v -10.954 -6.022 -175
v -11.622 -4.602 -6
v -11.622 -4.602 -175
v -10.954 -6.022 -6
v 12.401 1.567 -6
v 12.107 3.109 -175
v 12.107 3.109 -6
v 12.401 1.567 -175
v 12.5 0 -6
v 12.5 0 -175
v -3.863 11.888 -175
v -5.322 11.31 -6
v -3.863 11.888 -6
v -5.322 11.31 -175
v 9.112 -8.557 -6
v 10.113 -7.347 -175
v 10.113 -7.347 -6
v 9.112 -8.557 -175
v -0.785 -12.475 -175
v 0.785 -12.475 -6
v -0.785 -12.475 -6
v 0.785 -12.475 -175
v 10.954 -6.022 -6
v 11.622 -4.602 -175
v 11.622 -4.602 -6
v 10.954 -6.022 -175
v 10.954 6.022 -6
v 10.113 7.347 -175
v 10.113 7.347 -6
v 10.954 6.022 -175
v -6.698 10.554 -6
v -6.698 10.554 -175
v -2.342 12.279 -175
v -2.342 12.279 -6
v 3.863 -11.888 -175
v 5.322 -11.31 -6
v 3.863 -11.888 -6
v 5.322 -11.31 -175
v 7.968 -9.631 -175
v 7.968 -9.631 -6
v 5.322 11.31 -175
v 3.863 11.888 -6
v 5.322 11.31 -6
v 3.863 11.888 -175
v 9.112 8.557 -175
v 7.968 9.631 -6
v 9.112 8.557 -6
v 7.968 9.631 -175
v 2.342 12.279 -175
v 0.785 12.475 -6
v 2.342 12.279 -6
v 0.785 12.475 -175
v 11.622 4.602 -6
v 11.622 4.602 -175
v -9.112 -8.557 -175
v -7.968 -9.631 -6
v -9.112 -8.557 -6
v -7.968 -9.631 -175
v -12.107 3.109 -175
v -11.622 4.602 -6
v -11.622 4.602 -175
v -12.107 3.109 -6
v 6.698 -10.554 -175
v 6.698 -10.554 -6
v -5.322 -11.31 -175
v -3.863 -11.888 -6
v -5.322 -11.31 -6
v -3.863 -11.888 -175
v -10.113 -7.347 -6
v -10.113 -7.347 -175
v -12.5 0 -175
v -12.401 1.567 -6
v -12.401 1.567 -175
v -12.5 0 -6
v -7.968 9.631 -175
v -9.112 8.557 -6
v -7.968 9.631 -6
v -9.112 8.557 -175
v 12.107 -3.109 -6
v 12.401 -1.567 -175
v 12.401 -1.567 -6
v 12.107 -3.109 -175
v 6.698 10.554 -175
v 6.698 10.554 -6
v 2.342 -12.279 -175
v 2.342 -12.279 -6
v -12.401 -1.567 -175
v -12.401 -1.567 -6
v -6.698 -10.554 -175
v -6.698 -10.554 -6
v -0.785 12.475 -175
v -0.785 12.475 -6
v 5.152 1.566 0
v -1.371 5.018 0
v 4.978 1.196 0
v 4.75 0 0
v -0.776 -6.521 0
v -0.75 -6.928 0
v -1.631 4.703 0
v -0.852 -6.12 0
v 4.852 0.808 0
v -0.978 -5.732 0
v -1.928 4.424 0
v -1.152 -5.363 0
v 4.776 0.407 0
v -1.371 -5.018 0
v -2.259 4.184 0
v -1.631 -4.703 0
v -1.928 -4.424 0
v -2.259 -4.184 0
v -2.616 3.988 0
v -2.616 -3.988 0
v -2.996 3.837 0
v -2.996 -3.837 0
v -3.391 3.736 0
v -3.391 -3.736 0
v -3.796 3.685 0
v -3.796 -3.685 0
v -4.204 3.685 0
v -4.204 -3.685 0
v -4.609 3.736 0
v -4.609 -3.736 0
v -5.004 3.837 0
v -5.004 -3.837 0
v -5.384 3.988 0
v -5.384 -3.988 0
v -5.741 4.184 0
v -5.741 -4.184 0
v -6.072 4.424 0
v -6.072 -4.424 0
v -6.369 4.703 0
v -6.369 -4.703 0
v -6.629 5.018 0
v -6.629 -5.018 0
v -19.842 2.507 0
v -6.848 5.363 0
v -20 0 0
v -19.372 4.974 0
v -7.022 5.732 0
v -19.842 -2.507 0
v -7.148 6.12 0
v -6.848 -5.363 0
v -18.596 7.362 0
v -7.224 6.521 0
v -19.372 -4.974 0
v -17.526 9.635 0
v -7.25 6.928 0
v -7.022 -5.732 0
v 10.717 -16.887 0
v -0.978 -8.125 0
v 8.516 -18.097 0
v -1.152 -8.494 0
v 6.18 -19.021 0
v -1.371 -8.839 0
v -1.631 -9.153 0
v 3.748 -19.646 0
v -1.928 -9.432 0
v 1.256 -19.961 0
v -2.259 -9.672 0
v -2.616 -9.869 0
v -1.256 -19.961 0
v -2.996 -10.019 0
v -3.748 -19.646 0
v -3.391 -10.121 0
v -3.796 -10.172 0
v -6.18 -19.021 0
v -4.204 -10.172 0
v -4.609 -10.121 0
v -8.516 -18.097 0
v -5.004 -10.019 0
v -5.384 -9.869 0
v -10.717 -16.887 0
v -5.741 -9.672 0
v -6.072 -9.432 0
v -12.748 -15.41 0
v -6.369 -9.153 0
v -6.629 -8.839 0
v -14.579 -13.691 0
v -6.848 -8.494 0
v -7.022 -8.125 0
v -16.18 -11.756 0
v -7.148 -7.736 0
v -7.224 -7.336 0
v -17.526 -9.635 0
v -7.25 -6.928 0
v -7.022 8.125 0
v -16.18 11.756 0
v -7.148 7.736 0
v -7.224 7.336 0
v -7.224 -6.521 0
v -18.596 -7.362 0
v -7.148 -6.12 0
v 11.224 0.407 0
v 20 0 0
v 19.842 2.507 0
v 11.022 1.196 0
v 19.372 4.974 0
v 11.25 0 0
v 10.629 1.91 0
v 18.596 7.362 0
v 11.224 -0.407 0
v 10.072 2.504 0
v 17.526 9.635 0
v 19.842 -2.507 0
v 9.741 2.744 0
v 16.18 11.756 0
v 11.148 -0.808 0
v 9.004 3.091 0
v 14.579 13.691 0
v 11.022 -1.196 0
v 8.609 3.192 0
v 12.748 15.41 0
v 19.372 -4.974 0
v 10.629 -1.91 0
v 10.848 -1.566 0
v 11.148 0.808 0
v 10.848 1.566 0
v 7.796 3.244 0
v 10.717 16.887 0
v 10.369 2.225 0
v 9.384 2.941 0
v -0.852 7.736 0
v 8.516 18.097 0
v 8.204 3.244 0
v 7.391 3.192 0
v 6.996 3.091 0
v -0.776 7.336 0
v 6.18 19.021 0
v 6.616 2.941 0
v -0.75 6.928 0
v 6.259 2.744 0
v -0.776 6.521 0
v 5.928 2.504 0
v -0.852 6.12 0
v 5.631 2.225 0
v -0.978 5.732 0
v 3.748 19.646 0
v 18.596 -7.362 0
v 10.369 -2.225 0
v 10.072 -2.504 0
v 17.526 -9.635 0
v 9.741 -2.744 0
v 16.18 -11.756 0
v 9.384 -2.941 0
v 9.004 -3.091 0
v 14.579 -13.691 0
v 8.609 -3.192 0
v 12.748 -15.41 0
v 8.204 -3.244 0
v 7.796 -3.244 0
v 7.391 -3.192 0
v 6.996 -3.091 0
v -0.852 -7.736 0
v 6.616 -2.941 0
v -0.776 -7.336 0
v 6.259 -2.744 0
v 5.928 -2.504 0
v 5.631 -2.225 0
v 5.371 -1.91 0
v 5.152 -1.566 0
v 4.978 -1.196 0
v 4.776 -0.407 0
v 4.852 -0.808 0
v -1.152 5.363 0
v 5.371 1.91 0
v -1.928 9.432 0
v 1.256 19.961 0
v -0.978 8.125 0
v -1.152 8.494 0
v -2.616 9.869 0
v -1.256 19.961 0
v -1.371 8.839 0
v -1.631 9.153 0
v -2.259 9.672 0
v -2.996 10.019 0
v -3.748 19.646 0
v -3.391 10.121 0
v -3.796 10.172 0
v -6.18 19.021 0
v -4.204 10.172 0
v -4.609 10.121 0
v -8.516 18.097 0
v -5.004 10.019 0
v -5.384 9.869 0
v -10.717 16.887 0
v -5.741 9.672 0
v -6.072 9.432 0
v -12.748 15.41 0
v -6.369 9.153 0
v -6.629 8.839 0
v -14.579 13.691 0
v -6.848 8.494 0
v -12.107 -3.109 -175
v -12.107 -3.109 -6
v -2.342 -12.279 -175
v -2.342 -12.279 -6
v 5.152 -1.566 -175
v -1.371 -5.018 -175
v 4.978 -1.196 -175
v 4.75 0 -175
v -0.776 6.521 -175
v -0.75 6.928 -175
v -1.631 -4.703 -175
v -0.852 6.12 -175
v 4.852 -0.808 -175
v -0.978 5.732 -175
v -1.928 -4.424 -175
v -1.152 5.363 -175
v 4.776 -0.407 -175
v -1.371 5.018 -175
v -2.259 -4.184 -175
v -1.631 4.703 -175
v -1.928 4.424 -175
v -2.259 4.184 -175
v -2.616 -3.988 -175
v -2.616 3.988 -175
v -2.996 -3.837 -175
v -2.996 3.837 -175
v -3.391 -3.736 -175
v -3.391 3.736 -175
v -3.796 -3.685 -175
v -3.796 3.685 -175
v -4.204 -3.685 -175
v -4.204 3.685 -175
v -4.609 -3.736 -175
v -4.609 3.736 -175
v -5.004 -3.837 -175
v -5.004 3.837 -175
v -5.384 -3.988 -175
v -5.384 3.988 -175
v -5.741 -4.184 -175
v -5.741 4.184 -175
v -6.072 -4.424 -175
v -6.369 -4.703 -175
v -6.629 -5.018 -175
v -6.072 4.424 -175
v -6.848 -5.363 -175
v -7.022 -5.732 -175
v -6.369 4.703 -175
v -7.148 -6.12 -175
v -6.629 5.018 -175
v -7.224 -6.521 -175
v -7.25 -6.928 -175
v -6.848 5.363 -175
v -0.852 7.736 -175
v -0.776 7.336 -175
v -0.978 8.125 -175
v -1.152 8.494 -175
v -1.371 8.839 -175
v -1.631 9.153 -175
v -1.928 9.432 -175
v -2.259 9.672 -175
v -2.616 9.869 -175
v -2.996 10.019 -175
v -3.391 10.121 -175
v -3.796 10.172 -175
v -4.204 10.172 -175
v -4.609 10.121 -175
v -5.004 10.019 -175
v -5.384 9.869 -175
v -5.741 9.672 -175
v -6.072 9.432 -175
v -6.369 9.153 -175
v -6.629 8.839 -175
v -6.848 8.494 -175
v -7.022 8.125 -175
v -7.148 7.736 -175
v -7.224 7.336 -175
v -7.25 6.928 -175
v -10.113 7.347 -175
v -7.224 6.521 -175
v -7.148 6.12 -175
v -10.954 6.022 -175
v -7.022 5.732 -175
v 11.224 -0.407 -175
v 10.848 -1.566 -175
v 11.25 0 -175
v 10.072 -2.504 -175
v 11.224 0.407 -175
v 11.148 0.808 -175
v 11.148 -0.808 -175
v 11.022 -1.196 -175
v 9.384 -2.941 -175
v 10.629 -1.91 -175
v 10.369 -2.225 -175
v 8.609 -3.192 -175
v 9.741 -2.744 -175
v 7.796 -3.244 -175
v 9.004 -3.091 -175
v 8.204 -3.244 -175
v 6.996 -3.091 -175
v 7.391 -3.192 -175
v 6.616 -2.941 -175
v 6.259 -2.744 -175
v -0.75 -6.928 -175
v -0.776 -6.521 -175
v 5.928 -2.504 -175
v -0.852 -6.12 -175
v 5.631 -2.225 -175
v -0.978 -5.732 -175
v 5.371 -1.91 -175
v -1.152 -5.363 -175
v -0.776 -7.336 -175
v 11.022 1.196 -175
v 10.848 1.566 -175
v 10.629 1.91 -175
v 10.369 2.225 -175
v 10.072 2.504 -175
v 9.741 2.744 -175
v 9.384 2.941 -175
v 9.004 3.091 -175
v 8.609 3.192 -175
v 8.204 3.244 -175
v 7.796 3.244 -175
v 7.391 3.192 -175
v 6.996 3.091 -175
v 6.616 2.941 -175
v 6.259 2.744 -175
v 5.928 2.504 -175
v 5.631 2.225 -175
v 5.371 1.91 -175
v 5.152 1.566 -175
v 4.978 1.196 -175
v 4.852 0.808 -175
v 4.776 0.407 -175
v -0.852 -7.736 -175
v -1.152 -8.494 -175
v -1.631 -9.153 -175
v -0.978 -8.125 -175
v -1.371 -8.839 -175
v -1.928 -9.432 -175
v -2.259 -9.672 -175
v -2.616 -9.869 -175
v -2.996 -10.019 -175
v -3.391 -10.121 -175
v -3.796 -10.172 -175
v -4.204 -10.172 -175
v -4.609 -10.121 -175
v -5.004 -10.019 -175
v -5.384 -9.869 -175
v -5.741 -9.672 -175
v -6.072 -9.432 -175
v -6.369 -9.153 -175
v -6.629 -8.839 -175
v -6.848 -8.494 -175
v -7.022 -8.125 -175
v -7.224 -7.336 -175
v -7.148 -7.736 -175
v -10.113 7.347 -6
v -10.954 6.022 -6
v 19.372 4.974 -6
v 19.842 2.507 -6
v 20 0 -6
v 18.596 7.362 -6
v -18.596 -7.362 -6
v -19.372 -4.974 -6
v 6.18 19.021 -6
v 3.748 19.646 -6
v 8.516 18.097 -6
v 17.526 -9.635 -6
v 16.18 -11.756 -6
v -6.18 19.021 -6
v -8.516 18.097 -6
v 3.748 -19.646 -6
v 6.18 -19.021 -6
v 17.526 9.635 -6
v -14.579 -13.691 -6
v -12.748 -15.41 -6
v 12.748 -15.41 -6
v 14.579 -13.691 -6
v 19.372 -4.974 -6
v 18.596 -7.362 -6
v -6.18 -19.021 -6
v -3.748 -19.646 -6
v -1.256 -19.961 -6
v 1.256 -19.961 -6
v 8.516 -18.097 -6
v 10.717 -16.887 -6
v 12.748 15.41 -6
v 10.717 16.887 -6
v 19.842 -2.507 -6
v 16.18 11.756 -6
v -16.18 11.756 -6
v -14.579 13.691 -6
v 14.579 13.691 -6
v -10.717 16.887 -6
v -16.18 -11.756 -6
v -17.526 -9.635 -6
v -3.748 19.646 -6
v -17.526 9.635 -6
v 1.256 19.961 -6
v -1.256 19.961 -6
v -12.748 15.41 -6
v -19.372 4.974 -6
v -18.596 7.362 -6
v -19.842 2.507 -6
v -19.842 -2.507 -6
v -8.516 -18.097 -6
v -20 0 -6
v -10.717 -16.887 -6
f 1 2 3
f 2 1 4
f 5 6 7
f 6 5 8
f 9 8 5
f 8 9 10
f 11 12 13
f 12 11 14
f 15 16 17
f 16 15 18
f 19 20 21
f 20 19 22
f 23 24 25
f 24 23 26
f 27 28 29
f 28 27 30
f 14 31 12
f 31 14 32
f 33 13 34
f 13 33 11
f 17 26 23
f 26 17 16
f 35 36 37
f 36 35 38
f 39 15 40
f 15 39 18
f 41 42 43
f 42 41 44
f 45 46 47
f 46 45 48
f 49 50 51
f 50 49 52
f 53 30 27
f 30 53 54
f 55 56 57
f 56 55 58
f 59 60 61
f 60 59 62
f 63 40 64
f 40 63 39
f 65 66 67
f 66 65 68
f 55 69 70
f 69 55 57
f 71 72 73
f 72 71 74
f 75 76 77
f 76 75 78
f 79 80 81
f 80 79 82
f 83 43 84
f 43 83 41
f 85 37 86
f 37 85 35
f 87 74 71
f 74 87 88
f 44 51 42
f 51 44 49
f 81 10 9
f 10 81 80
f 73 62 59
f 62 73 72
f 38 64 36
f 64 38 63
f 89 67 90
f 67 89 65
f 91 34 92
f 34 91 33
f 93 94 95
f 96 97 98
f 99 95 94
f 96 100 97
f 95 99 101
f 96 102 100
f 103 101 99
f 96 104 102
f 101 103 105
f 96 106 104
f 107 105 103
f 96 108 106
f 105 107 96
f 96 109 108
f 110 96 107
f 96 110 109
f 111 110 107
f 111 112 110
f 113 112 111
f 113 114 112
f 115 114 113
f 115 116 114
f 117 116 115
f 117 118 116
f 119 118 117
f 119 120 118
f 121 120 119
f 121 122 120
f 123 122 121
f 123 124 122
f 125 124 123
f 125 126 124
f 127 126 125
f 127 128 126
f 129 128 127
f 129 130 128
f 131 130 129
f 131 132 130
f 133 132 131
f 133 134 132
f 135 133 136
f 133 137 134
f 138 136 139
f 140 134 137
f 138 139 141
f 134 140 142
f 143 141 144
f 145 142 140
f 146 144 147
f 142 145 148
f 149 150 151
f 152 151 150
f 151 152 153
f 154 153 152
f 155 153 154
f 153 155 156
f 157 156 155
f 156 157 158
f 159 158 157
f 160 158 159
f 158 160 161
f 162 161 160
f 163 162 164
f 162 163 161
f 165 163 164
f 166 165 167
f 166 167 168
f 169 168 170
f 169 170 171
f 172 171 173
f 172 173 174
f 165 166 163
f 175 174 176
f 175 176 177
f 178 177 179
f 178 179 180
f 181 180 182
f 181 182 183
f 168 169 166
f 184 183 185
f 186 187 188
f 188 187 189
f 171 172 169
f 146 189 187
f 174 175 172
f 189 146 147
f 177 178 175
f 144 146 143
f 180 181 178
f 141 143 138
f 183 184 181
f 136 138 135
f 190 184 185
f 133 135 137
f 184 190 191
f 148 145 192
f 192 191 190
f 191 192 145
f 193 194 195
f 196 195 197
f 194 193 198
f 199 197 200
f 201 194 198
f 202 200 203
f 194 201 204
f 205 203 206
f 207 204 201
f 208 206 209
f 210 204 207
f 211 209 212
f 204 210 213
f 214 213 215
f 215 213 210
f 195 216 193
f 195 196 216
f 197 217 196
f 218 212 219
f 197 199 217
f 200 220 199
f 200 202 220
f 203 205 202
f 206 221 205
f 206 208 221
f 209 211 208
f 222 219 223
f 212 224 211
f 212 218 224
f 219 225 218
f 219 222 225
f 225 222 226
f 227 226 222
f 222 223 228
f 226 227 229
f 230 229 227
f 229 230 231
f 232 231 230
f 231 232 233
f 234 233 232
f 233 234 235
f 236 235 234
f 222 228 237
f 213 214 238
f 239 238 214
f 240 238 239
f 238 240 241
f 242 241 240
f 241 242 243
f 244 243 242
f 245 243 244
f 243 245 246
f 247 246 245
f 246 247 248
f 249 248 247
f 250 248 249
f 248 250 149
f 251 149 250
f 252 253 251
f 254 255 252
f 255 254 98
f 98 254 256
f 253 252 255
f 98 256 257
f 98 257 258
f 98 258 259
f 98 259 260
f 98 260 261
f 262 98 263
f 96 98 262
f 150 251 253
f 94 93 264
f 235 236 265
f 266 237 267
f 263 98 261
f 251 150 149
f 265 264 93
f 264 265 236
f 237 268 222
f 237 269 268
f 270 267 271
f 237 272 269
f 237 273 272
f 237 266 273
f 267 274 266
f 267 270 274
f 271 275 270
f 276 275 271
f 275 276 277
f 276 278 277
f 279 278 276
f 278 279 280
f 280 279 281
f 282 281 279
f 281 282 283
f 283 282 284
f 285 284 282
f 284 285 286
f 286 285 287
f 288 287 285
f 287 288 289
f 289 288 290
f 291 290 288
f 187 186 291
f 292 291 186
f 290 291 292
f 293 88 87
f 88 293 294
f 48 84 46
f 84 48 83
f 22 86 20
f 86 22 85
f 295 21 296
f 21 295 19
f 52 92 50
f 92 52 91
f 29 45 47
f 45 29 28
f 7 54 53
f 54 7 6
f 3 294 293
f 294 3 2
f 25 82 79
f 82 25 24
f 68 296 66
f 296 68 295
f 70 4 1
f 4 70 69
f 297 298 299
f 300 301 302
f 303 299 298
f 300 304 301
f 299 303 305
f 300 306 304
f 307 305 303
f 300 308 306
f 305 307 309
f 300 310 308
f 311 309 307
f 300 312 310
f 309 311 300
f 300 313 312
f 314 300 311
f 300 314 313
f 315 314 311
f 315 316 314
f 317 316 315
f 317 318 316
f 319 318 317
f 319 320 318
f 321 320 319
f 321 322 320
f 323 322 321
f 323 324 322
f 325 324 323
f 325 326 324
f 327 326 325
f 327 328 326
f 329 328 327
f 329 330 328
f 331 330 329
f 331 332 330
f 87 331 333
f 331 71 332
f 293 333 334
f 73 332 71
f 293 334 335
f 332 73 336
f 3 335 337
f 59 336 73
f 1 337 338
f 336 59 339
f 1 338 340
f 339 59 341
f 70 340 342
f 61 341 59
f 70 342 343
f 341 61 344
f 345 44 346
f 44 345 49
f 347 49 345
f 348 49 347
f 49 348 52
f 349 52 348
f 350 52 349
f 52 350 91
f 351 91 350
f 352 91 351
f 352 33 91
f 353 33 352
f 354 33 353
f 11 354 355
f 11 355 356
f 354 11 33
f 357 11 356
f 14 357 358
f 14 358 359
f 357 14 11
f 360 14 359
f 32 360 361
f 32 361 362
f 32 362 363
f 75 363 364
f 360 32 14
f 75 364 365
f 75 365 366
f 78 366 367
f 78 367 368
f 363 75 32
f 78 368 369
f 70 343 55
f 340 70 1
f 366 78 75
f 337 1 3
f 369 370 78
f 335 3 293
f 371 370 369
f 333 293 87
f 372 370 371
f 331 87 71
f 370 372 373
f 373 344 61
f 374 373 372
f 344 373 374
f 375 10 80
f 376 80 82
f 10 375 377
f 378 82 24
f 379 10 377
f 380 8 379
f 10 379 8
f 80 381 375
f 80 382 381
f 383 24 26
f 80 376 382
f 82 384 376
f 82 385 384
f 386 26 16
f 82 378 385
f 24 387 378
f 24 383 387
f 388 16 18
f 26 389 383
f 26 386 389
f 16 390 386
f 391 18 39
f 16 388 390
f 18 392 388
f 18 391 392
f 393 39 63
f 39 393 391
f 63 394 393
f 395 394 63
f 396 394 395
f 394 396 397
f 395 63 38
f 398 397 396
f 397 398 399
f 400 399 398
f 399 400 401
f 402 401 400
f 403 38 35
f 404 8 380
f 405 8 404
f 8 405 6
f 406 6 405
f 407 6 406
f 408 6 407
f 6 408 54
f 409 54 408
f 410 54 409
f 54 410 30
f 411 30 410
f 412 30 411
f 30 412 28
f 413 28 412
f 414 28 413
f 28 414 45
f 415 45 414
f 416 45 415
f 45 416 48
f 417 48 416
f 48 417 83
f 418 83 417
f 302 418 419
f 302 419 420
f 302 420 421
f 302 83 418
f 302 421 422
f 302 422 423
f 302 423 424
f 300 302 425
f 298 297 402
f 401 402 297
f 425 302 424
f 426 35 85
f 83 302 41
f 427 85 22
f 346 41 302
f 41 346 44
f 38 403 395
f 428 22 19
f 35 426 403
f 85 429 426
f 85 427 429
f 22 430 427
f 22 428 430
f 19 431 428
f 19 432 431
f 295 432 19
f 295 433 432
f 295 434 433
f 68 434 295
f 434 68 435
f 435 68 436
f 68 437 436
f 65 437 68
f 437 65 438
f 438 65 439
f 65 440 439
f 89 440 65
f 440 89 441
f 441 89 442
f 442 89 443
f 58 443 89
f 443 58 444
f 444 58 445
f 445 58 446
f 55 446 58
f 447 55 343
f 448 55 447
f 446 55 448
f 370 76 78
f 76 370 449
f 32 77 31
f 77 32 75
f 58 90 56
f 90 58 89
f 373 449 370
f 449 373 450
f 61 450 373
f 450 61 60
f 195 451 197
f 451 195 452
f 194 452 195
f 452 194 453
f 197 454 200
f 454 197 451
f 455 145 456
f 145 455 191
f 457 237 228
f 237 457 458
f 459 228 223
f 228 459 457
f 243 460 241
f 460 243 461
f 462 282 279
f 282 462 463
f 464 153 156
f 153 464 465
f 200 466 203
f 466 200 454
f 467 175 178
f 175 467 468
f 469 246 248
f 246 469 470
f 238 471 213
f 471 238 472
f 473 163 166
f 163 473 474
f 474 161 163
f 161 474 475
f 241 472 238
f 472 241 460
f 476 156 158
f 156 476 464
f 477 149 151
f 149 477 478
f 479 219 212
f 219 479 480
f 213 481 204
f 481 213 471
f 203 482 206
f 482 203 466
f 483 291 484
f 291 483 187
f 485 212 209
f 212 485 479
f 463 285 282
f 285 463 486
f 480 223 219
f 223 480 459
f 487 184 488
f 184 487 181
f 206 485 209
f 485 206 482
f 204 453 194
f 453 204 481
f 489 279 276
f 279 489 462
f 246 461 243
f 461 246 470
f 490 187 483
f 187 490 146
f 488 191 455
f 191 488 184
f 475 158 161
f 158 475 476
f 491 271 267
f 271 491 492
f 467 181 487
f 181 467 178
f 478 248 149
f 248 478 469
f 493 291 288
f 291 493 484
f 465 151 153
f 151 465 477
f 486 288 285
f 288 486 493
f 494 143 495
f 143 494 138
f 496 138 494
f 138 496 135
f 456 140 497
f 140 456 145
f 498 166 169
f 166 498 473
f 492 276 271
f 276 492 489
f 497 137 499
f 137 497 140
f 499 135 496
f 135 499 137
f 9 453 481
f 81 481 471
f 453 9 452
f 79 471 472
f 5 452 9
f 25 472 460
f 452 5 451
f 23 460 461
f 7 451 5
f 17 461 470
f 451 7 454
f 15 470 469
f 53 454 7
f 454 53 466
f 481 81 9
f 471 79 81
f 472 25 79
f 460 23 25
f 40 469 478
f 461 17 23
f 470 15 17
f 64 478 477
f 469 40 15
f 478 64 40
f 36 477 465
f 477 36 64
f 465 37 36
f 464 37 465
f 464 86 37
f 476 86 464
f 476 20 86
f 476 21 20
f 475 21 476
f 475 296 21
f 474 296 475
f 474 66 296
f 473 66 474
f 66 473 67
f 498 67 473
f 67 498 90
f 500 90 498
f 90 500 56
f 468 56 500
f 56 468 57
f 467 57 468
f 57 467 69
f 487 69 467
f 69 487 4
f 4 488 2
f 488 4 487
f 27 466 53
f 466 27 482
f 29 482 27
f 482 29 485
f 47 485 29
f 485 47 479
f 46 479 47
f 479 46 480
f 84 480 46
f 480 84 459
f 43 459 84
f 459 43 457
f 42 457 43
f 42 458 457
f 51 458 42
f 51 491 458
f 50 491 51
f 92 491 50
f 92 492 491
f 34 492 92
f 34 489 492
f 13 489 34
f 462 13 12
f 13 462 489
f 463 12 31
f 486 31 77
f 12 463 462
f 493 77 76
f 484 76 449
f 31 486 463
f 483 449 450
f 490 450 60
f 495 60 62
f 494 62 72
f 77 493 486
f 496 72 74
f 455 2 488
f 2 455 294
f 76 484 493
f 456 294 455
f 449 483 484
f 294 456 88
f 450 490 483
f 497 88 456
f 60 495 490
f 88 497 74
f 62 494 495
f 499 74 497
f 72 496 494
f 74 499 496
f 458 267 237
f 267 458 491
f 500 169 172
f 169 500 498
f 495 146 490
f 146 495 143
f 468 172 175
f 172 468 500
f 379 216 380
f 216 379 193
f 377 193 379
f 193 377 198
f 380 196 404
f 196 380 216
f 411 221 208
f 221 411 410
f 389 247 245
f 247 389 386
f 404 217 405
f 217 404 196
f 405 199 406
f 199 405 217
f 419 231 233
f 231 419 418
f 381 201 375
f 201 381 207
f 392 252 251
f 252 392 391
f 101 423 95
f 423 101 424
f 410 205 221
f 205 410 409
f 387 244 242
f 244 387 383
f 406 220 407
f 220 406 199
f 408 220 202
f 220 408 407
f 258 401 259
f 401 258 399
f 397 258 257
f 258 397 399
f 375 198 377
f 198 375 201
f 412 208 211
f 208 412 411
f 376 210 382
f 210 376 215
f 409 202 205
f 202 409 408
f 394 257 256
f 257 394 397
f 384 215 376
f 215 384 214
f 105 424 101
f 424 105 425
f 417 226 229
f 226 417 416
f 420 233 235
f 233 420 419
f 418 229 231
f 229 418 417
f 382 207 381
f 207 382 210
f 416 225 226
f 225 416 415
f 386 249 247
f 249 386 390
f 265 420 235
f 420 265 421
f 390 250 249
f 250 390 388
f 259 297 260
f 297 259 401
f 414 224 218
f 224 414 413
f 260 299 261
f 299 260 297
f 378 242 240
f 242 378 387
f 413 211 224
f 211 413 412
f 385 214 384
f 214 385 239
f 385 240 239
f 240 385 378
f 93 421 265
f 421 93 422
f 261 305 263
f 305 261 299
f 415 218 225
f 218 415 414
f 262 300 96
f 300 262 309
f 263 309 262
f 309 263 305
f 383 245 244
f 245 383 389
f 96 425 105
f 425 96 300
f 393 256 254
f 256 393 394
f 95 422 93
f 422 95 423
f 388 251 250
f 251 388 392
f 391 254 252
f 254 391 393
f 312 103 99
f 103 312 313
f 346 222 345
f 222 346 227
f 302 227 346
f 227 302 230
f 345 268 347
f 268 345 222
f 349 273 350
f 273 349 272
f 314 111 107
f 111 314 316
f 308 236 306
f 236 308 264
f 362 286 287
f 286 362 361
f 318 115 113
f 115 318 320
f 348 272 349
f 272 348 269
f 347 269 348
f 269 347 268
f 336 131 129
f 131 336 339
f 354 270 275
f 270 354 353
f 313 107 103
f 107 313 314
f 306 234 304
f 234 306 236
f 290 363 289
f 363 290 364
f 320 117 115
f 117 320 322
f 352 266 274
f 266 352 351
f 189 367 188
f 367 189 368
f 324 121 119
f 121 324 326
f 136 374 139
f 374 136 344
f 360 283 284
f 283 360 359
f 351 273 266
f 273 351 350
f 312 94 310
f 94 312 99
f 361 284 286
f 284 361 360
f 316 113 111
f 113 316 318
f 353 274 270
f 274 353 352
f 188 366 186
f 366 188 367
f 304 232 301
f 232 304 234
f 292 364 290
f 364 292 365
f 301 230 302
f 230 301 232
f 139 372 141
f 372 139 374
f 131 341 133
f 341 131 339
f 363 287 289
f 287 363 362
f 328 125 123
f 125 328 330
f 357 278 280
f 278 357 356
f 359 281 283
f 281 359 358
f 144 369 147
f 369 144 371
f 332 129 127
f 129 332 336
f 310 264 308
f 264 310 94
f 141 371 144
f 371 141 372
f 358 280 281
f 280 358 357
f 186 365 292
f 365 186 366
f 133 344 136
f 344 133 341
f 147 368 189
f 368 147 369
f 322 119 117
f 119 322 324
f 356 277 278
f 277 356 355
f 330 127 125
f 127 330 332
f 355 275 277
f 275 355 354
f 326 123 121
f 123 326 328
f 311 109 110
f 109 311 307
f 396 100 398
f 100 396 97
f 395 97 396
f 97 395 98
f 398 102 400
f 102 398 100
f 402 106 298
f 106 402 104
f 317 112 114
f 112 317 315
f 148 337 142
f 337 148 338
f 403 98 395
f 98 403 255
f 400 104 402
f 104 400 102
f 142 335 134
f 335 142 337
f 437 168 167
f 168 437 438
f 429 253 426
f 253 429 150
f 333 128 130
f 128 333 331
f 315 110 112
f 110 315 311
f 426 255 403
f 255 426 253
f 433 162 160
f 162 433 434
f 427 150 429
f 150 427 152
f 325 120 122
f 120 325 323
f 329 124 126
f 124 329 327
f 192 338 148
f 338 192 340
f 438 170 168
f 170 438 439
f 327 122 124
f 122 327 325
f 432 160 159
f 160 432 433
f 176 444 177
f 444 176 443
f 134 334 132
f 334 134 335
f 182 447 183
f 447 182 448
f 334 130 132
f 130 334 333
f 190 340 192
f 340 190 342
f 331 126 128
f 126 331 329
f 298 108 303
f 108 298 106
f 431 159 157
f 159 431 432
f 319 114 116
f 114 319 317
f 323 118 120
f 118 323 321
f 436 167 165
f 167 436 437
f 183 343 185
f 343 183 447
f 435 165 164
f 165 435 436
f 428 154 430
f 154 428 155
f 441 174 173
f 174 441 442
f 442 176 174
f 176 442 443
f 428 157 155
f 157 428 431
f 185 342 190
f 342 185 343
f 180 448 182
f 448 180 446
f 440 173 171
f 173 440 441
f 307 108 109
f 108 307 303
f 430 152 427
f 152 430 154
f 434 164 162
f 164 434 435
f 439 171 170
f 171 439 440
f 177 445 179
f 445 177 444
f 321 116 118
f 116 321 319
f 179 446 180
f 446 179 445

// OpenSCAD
$fn = 50;


difference() {
	union() {
		translate(v = [0, 0, -175.0000000000]) {
			cylinder(h = 175, r = 12.5000000000);
		}
		translate(v = [0, 0, -6.0000000000]) {
			cylinder(h = 6, r = 20.0000000000);
		}
	}
	union() {
		#translate(v = [8.0000000000, 0.0000000000, -175]) {
			cylinder(h = 175, r = 3.2500000000);
		}
		#translate(v = [-4.0000000000, 6.9282032303, -175]) {
			cylinder(h = 175, r = 3.2500000000);
		}
		#translate(v = [-4.0000000000, -6.9282032303, -175]) {
			cylinder(h = 175, r = 3.2500000000);
		}
	}
}
